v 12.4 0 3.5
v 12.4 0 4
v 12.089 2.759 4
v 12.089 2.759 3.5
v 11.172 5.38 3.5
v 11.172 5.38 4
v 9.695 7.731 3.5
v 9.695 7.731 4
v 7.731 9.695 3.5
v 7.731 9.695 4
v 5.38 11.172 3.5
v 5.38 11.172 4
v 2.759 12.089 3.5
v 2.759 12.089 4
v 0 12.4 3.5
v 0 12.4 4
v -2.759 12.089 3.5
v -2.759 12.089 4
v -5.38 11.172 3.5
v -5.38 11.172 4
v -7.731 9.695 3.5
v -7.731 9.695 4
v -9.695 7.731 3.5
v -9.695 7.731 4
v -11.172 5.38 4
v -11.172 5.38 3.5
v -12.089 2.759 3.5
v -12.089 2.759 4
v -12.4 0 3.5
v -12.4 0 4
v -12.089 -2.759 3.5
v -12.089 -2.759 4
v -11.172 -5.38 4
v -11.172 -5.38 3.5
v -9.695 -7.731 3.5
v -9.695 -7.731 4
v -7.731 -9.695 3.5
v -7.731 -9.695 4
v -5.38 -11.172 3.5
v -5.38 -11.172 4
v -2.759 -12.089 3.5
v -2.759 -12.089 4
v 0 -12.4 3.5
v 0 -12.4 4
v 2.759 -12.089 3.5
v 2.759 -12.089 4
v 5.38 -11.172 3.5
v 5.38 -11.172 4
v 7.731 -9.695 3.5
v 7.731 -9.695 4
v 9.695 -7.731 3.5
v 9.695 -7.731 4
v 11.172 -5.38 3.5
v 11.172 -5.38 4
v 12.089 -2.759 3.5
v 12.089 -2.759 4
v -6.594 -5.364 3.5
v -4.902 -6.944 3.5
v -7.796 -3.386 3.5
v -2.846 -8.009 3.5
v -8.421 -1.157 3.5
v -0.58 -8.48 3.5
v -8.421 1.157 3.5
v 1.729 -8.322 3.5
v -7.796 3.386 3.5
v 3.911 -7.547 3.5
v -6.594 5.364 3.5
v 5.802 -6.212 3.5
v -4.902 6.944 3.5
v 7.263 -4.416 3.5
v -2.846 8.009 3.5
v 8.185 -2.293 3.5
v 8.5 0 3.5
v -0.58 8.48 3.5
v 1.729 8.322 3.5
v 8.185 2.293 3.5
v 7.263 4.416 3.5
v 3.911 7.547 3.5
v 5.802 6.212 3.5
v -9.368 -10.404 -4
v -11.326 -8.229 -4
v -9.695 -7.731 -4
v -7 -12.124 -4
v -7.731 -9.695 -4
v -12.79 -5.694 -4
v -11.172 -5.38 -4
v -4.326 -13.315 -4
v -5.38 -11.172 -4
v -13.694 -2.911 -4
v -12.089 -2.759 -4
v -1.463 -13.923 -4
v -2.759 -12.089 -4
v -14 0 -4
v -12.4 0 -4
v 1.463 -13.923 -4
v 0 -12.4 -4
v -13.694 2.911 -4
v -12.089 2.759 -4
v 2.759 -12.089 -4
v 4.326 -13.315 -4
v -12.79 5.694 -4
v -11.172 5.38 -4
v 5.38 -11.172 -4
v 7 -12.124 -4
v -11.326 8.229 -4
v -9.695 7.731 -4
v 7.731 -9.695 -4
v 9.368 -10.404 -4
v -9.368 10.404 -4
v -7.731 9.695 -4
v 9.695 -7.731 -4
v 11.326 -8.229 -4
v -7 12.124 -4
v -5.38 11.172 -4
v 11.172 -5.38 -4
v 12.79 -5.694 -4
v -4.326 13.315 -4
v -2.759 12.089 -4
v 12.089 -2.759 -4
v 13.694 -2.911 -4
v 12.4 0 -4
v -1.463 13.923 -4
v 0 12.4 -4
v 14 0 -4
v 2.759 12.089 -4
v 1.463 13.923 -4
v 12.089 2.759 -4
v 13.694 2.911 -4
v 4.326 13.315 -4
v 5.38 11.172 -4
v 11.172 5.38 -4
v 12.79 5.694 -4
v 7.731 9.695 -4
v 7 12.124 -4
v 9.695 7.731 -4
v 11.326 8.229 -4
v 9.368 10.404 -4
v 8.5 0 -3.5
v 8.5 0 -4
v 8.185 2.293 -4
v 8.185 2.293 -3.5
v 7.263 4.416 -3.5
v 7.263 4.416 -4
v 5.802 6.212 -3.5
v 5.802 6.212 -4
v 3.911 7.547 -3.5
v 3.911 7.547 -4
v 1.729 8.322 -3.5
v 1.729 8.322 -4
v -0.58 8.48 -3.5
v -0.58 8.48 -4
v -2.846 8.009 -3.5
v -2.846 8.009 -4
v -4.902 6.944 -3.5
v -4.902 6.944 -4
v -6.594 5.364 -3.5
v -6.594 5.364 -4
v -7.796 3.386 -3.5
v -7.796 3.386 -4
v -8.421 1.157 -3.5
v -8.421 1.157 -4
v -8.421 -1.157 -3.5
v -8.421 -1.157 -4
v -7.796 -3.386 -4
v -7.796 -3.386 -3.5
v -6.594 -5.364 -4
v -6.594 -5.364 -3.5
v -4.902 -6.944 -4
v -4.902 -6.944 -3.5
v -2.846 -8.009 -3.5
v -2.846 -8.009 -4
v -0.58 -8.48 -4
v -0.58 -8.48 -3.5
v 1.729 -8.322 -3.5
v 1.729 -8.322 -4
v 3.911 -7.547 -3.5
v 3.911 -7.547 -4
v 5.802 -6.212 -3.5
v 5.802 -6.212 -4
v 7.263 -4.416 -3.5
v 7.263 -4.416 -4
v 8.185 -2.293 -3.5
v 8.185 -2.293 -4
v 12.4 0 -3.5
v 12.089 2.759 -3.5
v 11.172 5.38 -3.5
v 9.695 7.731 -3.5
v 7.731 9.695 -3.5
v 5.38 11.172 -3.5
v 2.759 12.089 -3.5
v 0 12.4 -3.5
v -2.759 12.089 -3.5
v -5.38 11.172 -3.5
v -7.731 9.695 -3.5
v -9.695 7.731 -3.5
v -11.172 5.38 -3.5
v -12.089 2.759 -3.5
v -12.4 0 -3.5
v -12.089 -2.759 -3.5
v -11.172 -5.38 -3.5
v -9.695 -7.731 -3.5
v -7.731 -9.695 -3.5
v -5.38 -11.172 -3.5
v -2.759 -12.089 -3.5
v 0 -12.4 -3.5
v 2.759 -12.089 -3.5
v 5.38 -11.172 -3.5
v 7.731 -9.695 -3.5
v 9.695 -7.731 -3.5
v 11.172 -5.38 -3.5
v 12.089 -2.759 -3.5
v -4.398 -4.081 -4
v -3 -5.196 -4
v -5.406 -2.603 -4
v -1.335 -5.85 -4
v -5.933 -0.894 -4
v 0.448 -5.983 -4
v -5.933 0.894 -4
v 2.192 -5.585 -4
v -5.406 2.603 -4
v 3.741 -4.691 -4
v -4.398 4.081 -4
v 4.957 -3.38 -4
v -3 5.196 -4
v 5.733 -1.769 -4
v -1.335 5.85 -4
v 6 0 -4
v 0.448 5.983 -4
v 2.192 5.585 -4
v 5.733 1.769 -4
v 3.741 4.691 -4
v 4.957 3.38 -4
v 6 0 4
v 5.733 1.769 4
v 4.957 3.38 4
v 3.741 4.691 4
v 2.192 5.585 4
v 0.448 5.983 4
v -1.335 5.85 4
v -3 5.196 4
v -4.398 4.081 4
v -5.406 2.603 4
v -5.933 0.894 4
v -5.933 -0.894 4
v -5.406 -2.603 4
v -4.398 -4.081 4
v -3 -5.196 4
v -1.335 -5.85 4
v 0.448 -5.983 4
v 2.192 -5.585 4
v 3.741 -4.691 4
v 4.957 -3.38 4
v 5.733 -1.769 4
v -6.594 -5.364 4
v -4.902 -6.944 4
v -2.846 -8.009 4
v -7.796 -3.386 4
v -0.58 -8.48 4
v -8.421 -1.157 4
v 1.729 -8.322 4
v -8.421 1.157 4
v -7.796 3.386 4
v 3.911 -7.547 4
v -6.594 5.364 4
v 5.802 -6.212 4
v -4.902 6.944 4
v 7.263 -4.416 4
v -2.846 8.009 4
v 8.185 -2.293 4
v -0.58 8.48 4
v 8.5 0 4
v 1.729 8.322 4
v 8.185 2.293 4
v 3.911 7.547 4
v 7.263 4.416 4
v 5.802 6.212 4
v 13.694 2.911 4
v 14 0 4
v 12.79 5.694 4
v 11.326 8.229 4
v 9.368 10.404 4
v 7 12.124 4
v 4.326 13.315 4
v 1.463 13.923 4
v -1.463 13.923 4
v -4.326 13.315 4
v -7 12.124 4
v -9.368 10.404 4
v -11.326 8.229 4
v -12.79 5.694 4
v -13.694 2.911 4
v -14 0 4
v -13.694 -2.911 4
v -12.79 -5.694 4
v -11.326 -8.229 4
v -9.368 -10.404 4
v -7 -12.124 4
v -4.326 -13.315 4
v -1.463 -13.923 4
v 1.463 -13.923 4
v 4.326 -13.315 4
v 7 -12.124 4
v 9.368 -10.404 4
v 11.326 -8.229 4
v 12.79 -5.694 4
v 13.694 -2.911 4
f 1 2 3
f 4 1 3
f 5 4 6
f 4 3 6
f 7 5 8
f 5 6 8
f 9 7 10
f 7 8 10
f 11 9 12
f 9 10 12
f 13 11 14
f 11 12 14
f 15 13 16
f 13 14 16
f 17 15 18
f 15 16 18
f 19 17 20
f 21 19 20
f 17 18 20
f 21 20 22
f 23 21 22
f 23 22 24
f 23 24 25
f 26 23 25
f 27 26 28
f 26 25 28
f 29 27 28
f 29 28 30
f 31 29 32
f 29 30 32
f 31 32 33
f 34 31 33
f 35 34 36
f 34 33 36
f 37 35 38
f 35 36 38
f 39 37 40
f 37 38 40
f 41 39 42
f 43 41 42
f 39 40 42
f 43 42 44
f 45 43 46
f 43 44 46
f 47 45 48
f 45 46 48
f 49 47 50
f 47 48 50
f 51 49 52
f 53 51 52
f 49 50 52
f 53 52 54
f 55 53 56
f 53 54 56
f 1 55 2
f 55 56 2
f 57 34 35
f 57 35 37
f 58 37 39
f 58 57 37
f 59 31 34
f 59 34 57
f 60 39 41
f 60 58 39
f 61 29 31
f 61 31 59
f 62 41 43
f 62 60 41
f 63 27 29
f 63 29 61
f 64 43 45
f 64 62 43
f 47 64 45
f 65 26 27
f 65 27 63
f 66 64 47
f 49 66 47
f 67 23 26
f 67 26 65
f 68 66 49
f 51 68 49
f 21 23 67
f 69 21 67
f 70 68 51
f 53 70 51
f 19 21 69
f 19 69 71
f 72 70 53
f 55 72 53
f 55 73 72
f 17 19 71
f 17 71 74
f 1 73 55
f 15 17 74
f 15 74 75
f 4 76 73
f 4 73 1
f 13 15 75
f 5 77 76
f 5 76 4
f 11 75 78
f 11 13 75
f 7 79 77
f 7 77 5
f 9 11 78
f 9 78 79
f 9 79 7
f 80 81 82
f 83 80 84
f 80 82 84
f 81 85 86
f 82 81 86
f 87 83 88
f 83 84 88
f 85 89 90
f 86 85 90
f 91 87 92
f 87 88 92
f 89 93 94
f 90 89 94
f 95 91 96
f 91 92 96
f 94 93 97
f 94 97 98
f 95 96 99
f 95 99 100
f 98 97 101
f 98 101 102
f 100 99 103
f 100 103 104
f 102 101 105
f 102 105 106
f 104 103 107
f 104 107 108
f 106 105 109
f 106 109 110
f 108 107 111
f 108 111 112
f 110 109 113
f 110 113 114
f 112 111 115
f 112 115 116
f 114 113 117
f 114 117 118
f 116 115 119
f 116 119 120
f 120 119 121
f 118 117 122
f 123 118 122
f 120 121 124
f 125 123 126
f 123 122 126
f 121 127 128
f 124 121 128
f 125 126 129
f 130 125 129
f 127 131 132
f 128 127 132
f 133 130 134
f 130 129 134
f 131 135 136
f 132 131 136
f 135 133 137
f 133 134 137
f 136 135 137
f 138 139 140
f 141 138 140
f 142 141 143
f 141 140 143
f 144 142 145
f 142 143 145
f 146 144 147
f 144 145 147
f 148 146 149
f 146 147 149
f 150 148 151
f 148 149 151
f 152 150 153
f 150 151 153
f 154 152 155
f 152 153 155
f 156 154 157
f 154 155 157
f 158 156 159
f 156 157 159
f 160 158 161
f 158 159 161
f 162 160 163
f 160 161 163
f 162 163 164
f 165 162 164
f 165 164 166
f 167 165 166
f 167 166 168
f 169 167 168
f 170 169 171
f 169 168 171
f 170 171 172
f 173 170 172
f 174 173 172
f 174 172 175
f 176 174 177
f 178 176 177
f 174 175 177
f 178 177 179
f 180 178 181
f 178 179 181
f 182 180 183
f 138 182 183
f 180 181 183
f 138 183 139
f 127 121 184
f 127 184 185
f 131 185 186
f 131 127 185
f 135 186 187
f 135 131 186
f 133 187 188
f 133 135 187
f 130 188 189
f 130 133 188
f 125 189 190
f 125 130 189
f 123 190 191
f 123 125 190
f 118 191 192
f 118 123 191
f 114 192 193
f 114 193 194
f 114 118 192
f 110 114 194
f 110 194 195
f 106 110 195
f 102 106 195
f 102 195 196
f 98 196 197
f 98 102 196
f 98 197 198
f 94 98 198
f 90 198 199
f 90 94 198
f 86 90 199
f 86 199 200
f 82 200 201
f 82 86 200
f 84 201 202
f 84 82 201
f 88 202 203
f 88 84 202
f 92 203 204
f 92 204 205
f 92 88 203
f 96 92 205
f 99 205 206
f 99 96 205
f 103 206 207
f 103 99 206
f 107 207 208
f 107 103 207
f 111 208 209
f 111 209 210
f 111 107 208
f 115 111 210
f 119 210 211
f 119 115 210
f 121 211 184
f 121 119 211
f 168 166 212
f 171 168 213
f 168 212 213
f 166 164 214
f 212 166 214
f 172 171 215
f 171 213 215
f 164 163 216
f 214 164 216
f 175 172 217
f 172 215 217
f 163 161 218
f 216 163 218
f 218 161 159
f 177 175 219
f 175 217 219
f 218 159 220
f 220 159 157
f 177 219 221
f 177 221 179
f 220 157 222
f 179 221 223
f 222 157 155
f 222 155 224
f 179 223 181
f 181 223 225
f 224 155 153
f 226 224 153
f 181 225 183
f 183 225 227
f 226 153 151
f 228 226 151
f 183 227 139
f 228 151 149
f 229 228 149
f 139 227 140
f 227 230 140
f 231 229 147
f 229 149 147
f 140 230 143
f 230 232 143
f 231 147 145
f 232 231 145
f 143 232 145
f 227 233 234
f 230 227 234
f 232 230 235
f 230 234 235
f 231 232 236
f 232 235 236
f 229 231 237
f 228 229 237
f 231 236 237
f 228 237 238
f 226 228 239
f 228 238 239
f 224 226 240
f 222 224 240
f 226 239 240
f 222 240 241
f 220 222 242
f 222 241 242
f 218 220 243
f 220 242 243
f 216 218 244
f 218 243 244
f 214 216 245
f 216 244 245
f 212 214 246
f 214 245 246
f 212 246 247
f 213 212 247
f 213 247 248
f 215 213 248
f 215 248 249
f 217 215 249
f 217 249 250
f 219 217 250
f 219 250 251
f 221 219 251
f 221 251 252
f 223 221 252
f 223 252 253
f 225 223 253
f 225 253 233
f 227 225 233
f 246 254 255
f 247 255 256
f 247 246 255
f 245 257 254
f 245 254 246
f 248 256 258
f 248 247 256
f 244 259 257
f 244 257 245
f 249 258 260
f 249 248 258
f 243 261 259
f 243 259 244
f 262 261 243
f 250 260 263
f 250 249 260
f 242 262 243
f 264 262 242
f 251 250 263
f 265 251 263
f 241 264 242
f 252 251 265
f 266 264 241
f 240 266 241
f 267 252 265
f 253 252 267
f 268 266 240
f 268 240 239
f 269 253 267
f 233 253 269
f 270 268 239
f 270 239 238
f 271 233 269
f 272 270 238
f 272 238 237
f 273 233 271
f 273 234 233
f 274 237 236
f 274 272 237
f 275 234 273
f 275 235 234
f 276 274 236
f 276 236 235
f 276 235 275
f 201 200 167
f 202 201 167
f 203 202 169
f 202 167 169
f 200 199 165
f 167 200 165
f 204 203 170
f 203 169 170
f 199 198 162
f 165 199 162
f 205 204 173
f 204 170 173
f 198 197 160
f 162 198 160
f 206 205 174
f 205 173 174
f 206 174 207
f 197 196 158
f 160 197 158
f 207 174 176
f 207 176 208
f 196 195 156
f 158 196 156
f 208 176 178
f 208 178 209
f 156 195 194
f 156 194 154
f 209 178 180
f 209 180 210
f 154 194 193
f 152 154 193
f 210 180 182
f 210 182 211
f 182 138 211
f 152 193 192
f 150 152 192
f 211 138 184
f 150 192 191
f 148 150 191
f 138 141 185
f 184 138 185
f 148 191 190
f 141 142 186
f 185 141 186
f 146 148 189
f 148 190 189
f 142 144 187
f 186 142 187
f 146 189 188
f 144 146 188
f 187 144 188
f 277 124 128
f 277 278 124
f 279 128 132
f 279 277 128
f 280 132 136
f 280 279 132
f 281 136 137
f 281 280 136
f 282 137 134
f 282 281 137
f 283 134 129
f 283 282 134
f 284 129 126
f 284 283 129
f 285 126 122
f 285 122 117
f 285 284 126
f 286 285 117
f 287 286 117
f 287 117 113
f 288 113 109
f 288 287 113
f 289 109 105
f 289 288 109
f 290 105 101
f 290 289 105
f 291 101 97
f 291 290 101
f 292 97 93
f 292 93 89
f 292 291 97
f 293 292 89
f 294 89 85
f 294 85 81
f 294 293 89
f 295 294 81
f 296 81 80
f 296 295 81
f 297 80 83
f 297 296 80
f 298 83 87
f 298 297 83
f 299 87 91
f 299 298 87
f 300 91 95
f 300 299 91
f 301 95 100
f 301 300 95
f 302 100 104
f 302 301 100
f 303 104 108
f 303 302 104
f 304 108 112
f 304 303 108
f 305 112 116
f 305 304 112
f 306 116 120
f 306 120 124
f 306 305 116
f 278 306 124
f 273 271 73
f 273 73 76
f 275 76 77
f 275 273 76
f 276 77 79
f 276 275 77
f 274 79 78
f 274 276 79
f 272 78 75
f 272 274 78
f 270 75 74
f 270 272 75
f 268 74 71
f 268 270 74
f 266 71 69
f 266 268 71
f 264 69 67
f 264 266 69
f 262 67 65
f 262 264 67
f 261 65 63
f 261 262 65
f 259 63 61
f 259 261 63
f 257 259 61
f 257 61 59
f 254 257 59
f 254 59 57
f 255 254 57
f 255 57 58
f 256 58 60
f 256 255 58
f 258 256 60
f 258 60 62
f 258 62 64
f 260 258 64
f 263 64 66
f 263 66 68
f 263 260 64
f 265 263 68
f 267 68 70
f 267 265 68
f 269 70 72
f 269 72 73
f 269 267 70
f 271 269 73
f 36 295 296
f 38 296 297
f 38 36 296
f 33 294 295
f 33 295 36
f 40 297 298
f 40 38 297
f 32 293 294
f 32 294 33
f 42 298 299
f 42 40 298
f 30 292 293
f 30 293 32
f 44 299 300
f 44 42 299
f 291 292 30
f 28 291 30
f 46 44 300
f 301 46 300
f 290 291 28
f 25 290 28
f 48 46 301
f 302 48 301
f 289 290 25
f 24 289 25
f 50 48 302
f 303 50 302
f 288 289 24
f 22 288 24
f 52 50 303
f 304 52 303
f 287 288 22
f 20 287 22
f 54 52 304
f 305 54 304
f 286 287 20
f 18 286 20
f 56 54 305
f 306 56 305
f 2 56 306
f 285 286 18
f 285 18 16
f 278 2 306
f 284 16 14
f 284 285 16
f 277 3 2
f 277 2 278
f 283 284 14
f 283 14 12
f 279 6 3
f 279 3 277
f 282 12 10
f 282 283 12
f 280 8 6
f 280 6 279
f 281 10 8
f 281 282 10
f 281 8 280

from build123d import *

# Parameters (mm, degrees)
SKETCH_1_R          = 14
EXTRUDE_1_DEPTH     = 4
SKETCH_2_R          = 6
CUT_EXTRUDE_1_DEPTH = 9
SKETCH_3_R          = 12.4
SKETCH_3_R_2        = 8.5
CUT_EXTRUDE_2_DEPTH = 0.5


with BuildPart() as part:
    # 草圖1 → 填料-伸長1 (new body, symmetric)
    with BuildSketch(Plane.XY):
        Circle(SKETCH_1_R)
    extrude(amount=EXTRUDE_1_DEPTH, both=True)

    # 草圖2 → 除料-伸長1 (cut, through all)
    with BuildSketch(Plane.XY.offset(4)):
        Circle(SKETCH_2_R)
    extrude(amount=-CUT_EXTRUDE_1_DEPTH, mode=Mode.SUBTRACT)

    # 草圖3 → 除料-伸長2 (cut)
    with BuildSketch(Plane.XY.offset(4)):
        Circle(SKETCH_3_R)
        Circle(SKETCH_3_R_2, mode=Mode.SUBTRACT)
    cut_extrude_2 = extrude(amount=-CUT_EXTRUDE_2_DEPTH, mode=Mode.SUBTRACT)

    # 鏡射1: 除料-伸長2 across plane
    add(cut_extrude_2.mirror(Plane.XY), mode=Mode.SUBTRACT)


solid = part.part
